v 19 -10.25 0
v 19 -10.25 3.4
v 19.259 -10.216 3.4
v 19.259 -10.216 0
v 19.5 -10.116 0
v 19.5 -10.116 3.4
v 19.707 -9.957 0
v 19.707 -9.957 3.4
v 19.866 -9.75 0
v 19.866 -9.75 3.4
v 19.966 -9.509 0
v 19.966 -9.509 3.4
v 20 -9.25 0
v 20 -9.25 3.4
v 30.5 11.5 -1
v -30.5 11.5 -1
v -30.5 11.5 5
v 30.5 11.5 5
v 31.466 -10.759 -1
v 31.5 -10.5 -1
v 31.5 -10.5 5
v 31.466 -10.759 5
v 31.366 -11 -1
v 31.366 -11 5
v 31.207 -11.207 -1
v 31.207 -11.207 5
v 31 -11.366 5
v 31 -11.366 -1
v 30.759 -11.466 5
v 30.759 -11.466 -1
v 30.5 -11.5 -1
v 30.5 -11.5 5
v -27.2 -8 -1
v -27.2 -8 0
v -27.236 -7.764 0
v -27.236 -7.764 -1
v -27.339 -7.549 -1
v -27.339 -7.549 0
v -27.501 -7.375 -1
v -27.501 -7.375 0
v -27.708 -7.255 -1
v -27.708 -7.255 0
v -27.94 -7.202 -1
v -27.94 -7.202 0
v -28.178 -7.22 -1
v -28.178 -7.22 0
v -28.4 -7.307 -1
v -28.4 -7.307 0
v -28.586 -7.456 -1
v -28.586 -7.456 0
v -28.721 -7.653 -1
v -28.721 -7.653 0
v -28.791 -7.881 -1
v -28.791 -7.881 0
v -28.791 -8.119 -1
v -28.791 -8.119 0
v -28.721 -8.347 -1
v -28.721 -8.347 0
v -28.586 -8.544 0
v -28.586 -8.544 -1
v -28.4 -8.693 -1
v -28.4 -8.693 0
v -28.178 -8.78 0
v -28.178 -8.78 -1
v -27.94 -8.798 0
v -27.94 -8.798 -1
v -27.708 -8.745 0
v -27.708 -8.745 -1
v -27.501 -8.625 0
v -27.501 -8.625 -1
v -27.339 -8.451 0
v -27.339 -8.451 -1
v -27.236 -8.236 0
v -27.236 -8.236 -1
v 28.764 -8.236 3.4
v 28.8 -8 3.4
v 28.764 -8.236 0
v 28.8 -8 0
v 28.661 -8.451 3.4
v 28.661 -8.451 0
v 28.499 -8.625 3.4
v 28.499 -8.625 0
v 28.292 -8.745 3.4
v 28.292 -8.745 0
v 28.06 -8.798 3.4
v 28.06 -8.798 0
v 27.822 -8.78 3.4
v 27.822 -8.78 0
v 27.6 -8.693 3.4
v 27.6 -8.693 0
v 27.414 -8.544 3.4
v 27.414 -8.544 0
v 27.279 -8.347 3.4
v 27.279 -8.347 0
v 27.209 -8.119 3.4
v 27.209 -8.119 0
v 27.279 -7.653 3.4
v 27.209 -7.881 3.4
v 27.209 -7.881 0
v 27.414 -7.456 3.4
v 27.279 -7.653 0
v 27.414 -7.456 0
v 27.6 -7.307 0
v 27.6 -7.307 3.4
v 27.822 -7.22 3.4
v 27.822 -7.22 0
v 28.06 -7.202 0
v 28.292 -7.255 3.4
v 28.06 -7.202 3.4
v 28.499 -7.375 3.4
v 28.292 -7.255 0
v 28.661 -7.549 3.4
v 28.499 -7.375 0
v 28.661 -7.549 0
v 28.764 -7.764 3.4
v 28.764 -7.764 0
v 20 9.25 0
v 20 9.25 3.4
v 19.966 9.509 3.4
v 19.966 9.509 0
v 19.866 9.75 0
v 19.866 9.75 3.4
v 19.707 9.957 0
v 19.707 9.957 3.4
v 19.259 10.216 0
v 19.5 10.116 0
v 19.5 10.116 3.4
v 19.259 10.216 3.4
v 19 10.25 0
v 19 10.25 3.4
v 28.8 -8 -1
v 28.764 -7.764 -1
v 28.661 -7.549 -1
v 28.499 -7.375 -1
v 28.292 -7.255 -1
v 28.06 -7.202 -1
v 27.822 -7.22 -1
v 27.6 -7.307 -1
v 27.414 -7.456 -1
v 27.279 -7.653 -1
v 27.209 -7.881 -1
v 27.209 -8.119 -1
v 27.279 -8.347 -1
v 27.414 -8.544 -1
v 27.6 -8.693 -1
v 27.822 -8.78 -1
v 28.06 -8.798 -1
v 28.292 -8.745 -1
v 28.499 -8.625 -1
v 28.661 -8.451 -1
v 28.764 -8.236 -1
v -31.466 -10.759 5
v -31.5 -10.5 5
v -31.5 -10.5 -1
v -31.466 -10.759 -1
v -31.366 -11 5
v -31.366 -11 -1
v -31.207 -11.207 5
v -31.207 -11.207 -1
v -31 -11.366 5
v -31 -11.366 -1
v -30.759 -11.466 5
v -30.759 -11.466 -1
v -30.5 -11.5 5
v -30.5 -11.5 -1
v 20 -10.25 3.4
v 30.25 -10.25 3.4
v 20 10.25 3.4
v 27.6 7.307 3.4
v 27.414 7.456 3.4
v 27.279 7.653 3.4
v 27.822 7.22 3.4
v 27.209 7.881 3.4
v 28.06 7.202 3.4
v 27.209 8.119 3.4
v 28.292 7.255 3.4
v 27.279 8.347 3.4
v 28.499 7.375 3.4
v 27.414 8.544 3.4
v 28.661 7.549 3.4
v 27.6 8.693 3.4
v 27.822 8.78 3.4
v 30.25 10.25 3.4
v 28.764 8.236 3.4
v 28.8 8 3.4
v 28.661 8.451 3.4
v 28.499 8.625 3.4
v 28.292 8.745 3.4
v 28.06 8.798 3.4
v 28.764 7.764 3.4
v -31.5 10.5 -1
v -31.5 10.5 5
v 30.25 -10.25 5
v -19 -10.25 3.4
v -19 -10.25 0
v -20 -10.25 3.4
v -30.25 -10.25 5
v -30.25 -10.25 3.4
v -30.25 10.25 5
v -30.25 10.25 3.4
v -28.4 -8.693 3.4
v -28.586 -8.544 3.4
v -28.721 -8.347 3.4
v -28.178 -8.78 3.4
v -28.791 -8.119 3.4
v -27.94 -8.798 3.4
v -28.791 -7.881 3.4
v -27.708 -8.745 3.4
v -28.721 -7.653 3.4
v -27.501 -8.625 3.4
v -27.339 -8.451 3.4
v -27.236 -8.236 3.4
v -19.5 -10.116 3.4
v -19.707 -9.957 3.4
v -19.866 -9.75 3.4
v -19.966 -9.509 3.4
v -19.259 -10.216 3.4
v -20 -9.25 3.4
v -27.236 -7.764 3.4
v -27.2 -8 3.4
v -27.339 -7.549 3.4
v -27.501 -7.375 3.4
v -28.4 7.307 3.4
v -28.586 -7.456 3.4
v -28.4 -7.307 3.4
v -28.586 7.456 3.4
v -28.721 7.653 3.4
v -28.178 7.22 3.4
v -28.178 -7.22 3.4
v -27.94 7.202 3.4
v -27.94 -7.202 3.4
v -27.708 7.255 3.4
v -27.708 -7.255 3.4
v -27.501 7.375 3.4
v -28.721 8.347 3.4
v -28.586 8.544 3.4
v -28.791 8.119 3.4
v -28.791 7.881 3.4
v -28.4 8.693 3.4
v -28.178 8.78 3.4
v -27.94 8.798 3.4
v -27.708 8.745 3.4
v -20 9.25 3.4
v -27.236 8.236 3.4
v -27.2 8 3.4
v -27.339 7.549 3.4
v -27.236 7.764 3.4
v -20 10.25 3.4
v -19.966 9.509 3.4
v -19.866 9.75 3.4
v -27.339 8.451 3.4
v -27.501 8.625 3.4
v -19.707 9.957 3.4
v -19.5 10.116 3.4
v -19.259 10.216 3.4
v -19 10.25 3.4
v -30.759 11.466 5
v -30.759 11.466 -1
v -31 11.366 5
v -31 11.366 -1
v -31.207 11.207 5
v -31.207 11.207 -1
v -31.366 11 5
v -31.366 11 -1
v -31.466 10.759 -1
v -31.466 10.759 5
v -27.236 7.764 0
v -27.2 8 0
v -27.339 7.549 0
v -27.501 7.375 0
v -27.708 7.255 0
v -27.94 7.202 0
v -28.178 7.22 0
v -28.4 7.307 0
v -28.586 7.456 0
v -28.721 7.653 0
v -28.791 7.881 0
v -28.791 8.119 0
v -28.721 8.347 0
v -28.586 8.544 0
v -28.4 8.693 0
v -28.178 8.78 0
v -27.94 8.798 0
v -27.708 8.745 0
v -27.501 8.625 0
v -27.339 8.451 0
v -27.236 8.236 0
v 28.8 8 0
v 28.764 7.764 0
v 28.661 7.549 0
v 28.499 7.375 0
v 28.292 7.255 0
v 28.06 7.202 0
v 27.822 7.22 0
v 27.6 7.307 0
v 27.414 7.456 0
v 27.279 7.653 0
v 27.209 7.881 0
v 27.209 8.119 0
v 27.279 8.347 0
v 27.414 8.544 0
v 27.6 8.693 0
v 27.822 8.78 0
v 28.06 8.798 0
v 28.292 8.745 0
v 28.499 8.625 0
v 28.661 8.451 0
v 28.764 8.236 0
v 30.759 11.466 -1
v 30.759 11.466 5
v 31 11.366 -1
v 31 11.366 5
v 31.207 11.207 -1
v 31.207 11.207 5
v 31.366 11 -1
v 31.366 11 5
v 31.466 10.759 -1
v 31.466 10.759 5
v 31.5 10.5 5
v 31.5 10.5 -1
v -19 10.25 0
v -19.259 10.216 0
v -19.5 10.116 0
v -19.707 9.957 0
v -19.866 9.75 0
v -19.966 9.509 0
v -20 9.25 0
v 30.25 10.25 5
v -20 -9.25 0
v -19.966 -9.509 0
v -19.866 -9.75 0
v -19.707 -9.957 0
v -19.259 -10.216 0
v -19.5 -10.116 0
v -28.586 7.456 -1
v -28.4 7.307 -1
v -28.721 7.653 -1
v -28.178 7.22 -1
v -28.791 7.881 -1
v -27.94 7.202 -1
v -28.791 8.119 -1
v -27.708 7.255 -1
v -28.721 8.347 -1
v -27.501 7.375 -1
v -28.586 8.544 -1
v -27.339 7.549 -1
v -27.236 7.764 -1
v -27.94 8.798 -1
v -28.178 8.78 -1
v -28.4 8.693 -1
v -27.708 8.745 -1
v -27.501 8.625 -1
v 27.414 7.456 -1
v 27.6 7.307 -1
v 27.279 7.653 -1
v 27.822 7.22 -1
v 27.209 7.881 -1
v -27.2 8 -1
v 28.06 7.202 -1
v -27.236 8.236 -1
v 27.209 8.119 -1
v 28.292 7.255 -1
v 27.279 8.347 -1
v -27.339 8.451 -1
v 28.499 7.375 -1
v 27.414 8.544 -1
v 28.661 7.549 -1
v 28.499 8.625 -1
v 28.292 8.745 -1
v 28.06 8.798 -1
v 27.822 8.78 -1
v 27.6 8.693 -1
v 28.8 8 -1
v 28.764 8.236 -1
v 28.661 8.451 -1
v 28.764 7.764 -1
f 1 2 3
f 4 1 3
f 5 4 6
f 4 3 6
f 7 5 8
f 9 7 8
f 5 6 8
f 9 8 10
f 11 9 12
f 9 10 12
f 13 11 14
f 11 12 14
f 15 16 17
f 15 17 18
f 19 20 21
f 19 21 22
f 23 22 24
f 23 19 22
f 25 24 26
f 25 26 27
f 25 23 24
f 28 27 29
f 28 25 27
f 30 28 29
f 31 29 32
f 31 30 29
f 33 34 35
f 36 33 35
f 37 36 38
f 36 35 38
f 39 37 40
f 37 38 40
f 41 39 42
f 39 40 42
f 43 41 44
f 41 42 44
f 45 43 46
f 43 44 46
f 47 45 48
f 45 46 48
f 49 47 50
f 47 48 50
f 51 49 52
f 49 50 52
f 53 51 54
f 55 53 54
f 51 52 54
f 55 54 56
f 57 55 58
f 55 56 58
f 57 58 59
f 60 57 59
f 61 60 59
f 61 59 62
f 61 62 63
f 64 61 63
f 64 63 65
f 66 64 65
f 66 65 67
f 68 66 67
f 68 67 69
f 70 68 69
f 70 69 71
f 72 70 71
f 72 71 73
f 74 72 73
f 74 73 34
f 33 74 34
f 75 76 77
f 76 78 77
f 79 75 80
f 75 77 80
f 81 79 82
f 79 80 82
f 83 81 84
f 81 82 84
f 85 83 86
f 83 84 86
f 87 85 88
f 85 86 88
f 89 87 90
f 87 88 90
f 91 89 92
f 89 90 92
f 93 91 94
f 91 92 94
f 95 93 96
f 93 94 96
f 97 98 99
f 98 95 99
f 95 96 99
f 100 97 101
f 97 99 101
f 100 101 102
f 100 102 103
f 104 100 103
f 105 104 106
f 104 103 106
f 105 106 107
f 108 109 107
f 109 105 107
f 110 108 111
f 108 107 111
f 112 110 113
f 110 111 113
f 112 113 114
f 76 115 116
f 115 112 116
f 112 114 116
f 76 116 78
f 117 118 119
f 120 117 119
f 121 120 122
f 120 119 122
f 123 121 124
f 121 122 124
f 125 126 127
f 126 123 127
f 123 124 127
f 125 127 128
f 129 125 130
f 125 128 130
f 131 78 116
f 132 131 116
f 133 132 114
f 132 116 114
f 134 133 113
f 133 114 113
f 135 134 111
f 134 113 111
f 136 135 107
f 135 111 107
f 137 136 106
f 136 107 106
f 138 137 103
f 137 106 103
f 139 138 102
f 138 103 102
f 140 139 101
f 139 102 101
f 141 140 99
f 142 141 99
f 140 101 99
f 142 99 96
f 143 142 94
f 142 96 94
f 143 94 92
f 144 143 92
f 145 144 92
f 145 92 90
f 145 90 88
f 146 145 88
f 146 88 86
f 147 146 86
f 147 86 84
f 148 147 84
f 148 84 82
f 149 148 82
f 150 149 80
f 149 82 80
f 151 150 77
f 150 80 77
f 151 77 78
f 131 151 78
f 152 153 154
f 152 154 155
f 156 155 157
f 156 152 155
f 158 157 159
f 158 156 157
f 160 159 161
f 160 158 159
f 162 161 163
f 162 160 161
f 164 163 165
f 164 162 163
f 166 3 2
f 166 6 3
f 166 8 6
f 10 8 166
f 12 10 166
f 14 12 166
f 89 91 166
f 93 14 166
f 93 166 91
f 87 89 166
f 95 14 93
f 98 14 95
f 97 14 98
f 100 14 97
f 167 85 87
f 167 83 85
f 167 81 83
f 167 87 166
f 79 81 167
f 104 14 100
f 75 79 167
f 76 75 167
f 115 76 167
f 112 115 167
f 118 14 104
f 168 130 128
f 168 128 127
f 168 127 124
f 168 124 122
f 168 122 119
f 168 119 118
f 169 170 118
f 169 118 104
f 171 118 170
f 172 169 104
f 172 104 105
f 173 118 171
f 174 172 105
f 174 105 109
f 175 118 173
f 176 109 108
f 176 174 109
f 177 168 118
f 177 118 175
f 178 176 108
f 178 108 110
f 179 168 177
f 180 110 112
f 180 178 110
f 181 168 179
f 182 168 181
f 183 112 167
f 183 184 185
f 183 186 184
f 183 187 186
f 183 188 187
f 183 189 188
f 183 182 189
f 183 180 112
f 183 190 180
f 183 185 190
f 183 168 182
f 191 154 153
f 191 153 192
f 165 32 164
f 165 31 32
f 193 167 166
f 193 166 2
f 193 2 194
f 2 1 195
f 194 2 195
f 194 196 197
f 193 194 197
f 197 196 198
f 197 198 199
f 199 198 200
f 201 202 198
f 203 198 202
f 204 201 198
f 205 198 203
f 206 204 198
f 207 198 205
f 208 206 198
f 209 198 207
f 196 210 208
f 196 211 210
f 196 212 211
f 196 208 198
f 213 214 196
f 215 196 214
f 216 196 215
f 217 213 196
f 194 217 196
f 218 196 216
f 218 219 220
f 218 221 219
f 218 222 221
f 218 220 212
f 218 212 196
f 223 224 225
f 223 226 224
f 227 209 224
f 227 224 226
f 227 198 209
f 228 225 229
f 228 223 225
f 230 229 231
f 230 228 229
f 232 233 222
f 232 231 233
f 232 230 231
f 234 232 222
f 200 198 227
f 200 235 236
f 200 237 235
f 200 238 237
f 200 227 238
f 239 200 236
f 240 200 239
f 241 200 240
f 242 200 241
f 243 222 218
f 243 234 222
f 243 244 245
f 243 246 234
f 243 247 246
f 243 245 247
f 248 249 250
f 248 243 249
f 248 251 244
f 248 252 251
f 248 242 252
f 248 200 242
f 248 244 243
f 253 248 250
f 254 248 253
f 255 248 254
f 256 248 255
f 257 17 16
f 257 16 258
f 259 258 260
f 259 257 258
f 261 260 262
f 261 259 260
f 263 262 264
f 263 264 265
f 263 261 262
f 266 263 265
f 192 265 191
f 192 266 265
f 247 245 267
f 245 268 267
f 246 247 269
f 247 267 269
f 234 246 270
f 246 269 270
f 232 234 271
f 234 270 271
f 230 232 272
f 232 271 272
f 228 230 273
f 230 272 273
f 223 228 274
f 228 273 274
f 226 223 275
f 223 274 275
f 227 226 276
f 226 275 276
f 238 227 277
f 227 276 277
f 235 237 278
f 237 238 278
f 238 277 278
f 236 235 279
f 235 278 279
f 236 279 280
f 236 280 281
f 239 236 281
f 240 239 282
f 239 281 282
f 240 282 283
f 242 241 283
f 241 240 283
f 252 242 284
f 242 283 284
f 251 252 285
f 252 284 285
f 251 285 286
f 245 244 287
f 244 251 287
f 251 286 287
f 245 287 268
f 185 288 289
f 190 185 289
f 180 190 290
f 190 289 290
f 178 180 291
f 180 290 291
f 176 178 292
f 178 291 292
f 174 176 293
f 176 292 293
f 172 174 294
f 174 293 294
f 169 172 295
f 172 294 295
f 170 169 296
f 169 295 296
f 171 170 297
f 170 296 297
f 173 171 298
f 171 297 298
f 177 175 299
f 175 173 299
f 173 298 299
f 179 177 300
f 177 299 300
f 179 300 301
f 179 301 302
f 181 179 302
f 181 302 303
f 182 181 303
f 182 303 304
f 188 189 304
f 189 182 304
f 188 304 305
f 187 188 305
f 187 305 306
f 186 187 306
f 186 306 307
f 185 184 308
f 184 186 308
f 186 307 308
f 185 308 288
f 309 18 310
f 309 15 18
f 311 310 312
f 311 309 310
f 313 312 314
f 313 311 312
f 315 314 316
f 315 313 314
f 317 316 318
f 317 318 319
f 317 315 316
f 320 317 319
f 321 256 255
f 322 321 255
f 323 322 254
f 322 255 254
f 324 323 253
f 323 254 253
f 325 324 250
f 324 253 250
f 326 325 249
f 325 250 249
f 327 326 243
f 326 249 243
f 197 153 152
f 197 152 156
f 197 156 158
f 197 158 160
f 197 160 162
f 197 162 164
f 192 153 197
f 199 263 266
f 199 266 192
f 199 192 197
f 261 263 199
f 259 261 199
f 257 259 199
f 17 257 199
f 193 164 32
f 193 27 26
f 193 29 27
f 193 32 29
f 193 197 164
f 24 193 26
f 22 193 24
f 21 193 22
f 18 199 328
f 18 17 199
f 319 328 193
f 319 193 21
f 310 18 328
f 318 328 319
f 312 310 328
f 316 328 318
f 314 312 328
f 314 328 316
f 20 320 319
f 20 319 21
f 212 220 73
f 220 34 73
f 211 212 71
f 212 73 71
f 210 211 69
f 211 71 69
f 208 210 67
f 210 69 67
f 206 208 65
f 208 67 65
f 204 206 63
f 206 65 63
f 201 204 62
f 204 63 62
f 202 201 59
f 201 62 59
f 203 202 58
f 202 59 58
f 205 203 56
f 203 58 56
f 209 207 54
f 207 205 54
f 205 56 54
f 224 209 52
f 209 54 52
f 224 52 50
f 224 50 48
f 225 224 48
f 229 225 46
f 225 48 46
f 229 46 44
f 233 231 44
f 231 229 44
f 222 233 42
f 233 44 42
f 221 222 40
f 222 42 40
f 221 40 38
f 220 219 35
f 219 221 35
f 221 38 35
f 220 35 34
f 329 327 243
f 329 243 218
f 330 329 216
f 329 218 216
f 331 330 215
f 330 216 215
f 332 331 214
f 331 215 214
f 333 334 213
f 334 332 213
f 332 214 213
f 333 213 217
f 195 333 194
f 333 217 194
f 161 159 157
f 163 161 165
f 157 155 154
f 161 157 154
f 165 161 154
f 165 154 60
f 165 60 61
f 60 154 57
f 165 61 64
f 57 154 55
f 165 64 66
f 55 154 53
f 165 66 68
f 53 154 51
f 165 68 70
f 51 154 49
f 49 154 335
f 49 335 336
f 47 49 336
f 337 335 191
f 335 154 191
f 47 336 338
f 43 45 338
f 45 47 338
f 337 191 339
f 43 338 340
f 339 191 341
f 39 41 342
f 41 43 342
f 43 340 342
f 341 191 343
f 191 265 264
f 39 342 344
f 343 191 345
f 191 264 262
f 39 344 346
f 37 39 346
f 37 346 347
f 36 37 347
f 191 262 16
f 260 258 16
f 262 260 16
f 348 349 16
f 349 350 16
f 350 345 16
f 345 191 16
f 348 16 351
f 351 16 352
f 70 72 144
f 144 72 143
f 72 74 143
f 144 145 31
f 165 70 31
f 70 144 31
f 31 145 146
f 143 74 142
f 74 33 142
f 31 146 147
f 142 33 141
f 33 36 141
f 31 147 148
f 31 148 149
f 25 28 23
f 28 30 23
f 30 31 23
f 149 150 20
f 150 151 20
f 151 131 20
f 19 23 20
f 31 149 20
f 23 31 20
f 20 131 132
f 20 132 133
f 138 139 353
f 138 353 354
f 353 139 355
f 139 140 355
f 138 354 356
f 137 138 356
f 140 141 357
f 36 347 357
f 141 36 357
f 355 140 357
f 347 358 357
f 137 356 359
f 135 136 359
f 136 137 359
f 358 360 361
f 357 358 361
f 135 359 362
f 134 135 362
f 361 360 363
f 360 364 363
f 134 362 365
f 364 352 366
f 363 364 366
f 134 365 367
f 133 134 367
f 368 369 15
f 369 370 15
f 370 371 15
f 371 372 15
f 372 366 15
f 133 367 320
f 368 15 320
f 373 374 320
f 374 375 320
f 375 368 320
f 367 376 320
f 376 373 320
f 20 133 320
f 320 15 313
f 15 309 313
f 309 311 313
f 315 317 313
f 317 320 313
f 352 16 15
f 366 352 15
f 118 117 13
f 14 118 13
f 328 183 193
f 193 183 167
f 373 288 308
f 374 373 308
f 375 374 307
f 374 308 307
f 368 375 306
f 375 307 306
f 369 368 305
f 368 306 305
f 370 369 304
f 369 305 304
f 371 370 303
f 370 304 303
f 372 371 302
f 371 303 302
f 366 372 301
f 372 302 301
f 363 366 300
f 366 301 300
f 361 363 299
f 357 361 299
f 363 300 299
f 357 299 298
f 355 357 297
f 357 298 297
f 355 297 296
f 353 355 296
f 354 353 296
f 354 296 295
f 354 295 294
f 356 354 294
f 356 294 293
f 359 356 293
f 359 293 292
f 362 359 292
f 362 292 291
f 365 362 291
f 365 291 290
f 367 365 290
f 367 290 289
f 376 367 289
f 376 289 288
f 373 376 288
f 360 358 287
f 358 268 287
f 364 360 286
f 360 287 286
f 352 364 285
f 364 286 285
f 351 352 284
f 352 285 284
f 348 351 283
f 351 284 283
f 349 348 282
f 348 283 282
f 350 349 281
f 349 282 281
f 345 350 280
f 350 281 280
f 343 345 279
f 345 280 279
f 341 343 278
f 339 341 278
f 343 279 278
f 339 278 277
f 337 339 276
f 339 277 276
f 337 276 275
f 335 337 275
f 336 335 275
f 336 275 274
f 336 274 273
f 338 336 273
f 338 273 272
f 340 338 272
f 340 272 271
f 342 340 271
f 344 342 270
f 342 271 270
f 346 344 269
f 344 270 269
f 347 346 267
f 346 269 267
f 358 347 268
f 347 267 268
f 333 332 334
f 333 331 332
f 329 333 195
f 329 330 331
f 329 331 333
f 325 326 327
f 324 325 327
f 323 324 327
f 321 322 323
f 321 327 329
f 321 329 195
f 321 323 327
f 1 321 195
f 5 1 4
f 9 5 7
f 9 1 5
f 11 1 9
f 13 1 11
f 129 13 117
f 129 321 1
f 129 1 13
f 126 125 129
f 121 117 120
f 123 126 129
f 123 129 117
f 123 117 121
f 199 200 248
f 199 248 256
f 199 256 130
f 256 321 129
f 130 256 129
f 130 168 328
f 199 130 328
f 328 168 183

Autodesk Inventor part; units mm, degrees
ref_plane "YZ Plane" through (0, 0, 0) normal (1, 0, 0) x (0, 1, 0)
ref_plane "XZ Plane" through (0, 0, 0) normal (0, 1, 0) x (-1, 0, 0)
ref_plane "XY Plane" through (0, 0, 0) normal (0, 0, 1) x (1, 0, 0)
sketch "スケッチ1" plane through (0, 0, 0) normal (0, 0, 1) x (1, 0, 0)
  line L0 (-31.5, 11.5) -> (31.5, 11.5)
  line L1 (31.5, 11.5) -> (31.5, -11.5)
  line L2 (31.5, -11.5) -> (-31.5, -11.5)
  line L3 (-31.5, -11.5) -> (-31.5, 11.5)
  line L4 (-31.5, 11.5) -> (31.5, -11.5) construction
  line L5 (31.5, 11.5) -> (-31.5, -11.5) construction
  line L6 (-30, 10) -> (30, 10) construction
  line L7 (30, 10) -> (30, -10) construction
  line L8 (30, -10) -> (-30, -10) construction
  line L9 (-30, -10) -> (-30, 10) construction
  line L10 (-30, 10) -> (30, -10) construction
  line L11 (30, 10) -> (-30, -10) construction
  circle A0 centre (-28, 8) radius 0.8
  line L12 (-31.5, 0) -> (31.5, 0) construction
  line L13 (0, 11.5) -> (0, -11.5) construction
  circle A1 centre (-28, -8) radius 0.8
  circle A2 centre (28, 8) radius 0.8
  circle A3 centre (28, -8) radius 0.8
  line L14 (-30.25, 10.25) -> (30.25, 10.25)
  line L15 (30.25, 10.25) -> (30.25, -10.25)
  line L16 (30.25, -10.25) -> (-30.25, -10.25)
  line L17 (-30.25, -10.25) -> (-30.25, 10.25)
  line L18 (-30.25, 10.25) -> (30.25, -10.25) construction
  line L19 (30.25, 10.25) -> (-30.25, -10.25) construction
  line L20 (-20, 10.25) -> (-20, -10.25)
  line L21 (20, 10.25) -> (20, -10.25)
  point P0 (0, 0)
  point P1 (0, 0)
  point P2 (20, -10.25)
  dimension "d0" = 63
  dimension "d1" = 60
  dimension "d2" = 20
  dimension "d3" = 23
  dimension "d4" = 1.6
  dimension "d5" = 2
  dimension "d6" = 2
  dimension "d7" = 20.5
  dimension "d8" = 60.5
  dimension "d13" = 10
extrude "押し出し1" add sketch "スケッチ1" against normal blind 1 contours L0 L1 L2 L3 | L14 L20 L16 L17 | L14 L21 L16 L20 | L14 L15 L16 L21
extrude "押し出し2" add sketch "スケッチ1" along normal blind 5 contours L0 L1 L2 L3
extrude "押し出し3" add sketch "スケッチ1" along normal blind 3.4 contours L14 L20 L16 L17 | L14 L15 L16 L21
fillet "フィレット1" radius 1 8 edges at (-31.5, -11.5, 2) (-31.5, 11.5, 2) (-20, 10.25, 1.7) (-20, -10.25, 1.7) (20, -10.25, 1.7) (20, 10.25, 1.7) (31.5, -11.5, 2) (31.5, 11.5, 2)
equation "\"d6\" = d5"
properties part number "StartStopSwitch_cover_01" material "アセタール樹脂、黒"
